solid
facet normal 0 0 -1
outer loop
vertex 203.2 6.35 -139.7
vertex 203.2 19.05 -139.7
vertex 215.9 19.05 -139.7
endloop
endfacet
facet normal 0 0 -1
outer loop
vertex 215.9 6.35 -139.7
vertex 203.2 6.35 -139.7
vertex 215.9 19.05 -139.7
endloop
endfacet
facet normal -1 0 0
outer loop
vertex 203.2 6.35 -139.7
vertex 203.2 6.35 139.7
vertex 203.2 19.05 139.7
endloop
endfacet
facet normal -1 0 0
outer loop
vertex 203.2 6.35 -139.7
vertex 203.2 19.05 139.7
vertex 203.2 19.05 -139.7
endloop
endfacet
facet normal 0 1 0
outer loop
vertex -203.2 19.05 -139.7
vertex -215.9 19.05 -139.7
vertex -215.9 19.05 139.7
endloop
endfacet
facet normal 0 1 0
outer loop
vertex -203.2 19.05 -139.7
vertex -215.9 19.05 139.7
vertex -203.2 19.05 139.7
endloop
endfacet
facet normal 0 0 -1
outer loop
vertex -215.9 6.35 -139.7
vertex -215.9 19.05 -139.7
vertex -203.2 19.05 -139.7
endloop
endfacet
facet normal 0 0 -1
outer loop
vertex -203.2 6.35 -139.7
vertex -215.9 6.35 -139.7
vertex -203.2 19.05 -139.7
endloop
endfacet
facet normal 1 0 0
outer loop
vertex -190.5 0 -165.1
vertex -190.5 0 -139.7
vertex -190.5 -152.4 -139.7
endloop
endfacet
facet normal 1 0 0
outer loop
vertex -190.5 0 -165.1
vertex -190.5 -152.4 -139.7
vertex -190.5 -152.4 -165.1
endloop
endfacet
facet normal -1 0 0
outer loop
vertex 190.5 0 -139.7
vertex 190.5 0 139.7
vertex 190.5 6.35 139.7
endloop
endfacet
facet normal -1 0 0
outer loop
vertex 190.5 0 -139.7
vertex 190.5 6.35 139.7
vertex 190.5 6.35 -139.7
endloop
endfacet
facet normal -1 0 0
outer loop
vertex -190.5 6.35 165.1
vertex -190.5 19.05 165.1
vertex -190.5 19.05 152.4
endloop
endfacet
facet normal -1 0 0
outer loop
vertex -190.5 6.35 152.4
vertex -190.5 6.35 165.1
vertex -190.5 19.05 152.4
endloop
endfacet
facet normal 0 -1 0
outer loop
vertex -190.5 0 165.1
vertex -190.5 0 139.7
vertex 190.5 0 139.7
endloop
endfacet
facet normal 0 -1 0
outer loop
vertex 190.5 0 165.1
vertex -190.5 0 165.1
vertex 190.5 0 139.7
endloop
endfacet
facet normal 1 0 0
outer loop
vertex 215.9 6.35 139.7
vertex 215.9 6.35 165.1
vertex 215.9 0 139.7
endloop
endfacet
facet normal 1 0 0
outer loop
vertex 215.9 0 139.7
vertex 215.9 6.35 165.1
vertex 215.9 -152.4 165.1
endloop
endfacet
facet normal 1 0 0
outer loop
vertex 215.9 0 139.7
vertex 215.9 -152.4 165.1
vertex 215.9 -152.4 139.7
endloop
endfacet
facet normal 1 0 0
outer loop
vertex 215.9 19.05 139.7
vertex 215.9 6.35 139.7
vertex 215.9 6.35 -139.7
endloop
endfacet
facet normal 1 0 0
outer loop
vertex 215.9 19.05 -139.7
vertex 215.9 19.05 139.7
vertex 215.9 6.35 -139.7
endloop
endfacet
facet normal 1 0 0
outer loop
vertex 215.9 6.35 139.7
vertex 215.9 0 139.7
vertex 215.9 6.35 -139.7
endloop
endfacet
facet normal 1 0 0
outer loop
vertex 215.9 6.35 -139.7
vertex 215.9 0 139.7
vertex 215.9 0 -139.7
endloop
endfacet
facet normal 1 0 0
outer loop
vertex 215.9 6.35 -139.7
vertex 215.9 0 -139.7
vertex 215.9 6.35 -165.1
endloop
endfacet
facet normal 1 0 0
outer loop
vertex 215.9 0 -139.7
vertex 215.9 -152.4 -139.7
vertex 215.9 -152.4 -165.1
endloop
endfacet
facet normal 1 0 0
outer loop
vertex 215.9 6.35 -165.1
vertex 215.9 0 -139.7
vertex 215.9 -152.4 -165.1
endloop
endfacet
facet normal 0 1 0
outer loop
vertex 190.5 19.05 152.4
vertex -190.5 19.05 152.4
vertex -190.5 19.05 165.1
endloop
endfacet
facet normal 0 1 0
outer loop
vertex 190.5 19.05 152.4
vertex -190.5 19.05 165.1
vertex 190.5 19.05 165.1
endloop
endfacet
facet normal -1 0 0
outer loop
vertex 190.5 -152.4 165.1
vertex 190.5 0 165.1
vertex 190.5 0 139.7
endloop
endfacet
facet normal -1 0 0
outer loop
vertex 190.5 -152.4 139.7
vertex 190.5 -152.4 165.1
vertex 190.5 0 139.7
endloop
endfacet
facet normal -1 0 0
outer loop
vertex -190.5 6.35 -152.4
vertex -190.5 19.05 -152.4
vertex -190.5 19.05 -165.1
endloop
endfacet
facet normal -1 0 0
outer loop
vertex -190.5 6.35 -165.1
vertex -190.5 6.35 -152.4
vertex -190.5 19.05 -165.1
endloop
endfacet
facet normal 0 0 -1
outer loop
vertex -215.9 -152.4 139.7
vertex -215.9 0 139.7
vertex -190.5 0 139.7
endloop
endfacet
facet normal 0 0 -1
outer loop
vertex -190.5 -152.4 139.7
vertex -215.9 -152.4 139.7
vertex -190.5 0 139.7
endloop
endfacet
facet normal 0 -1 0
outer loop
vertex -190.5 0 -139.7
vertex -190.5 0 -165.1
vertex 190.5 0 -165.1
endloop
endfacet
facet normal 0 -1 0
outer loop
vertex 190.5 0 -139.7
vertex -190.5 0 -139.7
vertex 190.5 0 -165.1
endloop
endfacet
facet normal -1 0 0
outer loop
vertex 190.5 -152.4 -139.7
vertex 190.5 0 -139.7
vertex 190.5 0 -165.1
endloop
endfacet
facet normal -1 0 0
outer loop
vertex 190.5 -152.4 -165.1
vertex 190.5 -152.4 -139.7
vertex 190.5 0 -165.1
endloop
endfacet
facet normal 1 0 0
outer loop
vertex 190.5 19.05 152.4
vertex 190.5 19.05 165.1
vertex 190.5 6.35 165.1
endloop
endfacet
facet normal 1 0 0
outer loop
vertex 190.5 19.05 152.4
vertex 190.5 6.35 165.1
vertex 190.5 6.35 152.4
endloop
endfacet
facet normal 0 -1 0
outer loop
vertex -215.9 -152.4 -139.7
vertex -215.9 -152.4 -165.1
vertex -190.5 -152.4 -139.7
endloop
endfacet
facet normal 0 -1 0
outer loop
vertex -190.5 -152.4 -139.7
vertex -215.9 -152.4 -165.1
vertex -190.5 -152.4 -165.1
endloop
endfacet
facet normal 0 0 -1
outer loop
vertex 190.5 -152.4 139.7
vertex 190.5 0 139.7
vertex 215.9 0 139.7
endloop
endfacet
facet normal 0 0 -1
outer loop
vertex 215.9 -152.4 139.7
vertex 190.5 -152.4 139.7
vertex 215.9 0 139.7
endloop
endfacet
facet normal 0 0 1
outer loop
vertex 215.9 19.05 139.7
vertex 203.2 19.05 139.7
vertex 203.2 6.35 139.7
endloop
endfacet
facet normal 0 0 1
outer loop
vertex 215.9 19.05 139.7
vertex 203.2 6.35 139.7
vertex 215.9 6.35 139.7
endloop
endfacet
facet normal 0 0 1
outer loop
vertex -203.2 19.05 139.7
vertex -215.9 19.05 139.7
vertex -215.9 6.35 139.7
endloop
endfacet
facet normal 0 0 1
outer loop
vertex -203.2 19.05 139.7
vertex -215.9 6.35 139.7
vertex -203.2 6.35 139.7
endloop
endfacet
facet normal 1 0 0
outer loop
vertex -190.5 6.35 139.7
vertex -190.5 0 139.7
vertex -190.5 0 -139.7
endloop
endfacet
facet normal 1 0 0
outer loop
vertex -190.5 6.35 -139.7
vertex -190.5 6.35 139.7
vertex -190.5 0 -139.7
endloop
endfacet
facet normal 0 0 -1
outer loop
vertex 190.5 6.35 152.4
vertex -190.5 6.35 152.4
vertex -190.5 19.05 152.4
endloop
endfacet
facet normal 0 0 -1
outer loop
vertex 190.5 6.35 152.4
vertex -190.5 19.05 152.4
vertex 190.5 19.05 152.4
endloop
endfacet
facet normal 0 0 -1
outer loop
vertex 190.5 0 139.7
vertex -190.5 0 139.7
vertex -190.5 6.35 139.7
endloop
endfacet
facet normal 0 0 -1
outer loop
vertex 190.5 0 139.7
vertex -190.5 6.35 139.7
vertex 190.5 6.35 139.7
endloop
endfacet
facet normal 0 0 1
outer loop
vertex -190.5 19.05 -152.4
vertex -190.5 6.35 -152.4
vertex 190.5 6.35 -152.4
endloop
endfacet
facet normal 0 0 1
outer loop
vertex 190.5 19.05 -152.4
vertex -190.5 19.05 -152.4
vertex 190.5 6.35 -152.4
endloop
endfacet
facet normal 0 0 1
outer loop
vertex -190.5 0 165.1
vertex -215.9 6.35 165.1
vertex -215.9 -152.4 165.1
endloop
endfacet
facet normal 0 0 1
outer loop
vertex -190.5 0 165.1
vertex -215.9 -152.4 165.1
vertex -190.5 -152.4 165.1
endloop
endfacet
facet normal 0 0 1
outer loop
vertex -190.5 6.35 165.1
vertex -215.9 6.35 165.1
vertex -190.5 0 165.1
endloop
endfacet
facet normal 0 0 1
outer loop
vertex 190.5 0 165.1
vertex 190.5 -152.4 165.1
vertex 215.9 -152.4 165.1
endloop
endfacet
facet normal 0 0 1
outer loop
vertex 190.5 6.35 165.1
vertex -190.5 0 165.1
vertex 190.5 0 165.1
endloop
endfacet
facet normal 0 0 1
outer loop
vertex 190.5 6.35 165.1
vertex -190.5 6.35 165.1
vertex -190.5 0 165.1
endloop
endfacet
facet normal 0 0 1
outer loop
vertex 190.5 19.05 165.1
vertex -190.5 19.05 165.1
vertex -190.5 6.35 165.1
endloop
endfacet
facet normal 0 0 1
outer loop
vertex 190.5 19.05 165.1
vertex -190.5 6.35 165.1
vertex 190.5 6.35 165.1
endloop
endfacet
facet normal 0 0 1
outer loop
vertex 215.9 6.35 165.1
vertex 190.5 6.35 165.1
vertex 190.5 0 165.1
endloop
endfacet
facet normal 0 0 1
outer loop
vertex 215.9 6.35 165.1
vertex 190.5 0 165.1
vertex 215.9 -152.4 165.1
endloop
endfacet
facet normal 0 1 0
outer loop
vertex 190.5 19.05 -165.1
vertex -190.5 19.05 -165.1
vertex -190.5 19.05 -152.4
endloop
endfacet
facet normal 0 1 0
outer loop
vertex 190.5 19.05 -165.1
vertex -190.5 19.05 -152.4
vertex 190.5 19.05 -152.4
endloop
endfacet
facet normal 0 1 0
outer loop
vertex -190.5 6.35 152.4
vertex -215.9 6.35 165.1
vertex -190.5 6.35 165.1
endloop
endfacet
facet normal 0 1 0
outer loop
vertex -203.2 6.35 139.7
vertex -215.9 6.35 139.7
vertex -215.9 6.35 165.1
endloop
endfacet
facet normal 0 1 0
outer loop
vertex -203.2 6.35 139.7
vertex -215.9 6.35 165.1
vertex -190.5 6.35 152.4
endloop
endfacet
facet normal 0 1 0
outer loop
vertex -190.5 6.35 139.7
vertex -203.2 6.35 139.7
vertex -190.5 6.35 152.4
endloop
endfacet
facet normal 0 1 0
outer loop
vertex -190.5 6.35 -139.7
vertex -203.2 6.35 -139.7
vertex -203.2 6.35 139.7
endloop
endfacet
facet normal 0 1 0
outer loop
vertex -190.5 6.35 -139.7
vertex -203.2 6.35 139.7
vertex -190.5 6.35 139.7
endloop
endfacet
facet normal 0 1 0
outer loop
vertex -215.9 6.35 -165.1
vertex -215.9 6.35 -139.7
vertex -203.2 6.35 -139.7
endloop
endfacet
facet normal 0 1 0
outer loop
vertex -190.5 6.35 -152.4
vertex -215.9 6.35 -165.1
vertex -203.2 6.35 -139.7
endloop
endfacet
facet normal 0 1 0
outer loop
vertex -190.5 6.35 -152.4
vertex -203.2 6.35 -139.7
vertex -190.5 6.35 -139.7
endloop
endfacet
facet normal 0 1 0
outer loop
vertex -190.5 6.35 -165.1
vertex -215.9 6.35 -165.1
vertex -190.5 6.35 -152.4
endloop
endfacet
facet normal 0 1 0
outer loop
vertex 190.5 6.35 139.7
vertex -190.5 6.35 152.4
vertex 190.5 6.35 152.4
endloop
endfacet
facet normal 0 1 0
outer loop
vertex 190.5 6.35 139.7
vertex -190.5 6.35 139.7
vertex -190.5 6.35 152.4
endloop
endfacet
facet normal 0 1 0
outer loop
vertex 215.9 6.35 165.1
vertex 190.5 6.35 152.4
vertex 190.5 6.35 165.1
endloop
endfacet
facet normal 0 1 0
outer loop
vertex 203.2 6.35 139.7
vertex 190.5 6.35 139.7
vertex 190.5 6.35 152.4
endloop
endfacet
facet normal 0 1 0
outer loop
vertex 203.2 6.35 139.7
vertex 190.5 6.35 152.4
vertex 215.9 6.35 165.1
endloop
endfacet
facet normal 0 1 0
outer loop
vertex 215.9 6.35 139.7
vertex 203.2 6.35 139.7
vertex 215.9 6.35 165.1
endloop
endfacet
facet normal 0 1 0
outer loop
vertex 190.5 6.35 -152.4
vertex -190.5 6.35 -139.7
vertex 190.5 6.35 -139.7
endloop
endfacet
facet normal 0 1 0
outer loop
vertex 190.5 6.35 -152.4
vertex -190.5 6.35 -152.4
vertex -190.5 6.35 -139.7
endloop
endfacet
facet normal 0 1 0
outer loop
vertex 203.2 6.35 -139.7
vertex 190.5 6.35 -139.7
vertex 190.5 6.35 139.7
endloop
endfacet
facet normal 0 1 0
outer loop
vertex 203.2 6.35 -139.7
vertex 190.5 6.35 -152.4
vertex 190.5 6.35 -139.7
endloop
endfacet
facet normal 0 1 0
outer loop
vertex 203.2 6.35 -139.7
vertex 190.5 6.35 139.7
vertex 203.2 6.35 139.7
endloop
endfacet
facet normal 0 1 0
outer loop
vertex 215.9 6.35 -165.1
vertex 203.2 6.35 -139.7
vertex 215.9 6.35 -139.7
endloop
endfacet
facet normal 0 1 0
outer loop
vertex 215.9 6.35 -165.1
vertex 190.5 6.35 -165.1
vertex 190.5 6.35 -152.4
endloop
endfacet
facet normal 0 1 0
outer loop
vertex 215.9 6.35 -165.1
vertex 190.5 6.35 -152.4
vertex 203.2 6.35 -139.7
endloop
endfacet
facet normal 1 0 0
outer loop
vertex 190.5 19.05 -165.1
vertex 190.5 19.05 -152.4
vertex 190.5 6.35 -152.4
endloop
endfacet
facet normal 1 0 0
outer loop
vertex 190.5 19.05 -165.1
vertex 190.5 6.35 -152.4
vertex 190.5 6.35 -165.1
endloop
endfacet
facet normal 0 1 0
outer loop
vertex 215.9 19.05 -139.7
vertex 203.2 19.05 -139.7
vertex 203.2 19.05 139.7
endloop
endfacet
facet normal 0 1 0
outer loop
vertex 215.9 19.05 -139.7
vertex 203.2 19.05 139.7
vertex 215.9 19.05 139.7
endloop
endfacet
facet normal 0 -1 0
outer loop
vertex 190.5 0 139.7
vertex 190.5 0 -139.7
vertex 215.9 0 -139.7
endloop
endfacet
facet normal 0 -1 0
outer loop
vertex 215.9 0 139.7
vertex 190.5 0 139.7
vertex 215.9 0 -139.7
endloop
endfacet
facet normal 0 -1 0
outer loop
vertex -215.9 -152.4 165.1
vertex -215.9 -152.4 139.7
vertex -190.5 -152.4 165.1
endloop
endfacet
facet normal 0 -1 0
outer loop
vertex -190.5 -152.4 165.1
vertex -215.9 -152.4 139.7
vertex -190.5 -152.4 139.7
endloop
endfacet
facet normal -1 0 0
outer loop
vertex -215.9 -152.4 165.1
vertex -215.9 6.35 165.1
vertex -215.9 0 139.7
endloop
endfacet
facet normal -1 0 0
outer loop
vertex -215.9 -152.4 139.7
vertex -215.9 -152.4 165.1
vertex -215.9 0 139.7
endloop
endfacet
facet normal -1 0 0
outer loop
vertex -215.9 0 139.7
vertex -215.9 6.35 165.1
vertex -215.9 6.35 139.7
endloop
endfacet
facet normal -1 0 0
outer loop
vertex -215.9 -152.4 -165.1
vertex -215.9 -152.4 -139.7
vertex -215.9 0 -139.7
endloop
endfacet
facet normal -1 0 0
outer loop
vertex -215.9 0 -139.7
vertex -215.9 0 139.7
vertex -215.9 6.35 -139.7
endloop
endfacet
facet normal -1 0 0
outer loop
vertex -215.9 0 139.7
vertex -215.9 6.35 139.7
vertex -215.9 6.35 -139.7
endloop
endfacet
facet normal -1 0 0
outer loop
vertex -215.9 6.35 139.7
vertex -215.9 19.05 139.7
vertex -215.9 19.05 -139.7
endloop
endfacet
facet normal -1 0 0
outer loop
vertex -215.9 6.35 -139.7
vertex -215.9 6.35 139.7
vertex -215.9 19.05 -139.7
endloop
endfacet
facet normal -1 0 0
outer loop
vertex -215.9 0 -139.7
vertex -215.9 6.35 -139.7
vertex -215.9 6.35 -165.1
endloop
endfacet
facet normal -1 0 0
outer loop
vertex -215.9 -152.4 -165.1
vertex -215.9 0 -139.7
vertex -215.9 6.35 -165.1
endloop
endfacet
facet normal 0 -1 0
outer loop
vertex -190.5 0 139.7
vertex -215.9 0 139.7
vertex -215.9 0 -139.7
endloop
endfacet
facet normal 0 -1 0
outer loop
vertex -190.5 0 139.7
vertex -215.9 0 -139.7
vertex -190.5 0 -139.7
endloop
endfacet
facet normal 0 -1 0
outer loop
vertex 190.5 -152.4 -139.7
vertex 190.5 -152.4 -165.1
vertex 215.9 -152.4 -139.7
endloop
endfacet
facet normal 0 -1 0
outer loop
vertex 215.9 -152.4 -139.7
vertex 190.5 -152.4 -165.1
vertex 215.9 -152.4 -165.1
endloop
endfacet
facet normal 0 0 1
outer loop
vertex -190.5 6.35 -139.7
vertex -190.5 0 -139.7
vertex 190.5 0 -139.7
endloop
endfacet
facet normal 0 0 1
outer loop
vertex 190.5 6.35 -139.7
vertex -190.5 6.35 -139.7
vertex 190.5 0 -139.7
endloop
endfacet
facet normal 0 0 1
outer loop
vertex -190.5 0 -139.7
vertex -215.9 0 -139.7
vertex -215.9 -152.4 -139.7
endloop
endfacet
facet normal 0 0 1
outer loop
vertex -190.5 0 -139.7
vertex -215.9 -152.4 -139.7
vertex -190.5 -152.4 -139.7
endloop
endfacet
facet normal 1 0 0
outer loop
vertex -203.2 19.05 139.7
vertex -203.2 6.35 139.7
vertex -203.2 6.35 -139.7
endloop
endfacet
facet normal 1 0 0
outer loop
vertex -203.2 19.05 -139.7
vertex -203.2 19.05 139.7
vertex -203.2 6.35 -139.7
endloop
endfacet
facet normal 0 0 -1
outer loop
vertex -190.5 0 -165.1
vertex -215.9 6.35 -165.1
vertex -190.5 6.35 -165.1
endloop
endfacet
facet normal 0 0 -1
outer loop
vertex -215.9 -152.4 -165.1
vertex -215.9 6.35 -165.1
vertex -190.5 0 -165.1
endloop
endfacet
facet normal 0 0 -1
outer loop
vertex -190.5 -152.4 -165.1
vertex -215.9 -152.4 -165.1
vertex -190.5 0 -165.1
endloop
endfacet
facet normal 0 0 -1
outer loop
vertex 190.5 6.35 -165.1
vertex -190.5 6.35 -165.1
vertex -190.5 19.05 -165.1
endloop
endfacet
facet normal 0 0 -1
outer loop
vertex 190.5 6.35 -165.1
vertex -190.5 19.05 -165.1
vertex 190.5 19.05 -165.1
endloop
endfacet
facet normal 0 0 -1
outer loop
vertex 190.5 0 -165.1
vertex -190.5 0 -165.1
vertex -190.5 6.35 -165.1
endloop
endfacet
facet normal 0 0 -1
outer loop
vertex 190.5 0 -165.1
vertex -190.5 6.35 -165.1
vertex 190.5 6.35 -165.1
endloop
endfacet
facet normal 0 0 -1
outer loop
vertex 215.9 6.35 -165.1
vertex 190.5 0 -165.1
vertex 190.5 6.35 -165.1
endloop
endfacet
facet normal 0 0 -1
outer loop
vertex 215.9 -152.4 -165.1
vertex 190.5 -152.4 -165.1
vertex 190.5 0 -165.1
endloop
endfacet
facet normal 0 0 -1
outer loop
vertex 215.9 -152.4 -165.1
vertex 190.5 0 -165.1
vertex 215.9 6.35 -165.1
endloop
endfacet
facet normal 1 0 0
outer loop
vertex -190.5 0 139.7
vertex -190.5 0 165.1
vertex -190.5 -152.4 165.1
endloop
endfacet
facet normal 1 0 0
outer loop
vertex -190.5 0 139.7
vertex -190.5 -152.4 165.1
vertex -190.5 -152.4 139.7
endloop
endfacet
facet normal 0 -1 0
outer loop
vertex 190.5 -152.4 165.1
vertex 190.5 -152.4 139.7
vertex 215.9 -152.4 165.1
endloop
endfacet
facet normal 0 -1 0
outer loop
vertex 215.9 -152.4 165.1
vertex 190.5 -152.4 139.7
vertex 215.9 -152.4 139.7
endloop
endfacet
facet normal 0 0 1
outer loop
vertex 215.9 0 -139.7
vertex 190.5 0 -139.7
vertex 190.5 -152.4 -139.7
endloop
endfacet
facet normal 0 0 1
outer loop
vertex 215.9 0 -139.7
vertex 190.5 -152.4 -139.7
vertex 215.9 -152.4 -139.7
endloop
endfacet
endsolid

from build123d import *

# Parameters (mm, degrees)
SKETCH1_W           = 431.8
SKETCH1_H           = 330.2
SKETCH1_W_2         = 381
SKETCH1_H_2         = 279.4
BOSS_EXTRUDE1_DEPTH = 6.35
SKETCH2_W           = 25.4
SKETCH2_H           = 25.4
BOSS_EXTRUDE2_DEPTH = 152.4
SKETCH3_W           = 12.7
SKETCH3_H           = 279.4
SKETCH3_W_2         = 381
SKETCH3_H_2         = 12.7
BOSS_EXTRUDE3_DEPTH = 12.7


with BuildPart() as part:
    # Sketch1 → Boss-Extrude1 (new body)
    with BuildSketch(Plane(origin=(0, 0, 0), x_dir=(1, 0, 0), z_dir=(0, 1, 0))):
        Rectangle(SKETCH1_W, SKETCH1_H)
        Rectangle(SKETCH1_W_2, SKETCH1_H_2, mode=Mode.SUBTRACT)
    extrude(amount=BOSS_EXTRUDE1_DEPTH)

    # Sketch2 → Boss-Extrude2 (add)
    with BuildSketch(Plane(origin=(0, 0, 0), x_dir=(1, 0, 0), z_dir=(0, 1, 0))):
        with Locations((-203.2, -152.4)):
            Rectangle(SKETCH2_W, SKETCH2_H)
        with Locations((-203.2, 152.4)):
            Rectangle(SKETCH2_W, SKETCH2_H)
        with Locations((203.2, 152.4)):
            Rectangle(SKETCH2_W, SKETCH2_H)
        with Locations((203.2, -152.4)):
            Rectangle(SKETCH2_W, SKETCH2_H)
    extrude(amount=-BOSS_EXTRUDE2_DEPTH)

    # Sketch3 → Boss-Extrude3 (add)
    with BuildSketch(Plane(origin=(0, 6.35, 0), x_dir=(1, 0, 0), z_dir=(0, 1, 0))):
        with Locations((-209.55, 0)):
            Rectangle(SKETCH3_W, SKETCH3_H)
        with Locations((0, 158.75)):
            Rectangle(SKETCH3_W_2, SKETCH3_H_2)
        with Locations((209.55, 0)):
            Rectangle(SKETCH3_W, SKETCH3_H)
        with Locations((0, -158.75)):
            Rectangle(SKETCH3_W_2, SKETCH3_H_2)
    extrude(amount=BOSS_EXTRUDE3_DEPTH)


solid = part.part
